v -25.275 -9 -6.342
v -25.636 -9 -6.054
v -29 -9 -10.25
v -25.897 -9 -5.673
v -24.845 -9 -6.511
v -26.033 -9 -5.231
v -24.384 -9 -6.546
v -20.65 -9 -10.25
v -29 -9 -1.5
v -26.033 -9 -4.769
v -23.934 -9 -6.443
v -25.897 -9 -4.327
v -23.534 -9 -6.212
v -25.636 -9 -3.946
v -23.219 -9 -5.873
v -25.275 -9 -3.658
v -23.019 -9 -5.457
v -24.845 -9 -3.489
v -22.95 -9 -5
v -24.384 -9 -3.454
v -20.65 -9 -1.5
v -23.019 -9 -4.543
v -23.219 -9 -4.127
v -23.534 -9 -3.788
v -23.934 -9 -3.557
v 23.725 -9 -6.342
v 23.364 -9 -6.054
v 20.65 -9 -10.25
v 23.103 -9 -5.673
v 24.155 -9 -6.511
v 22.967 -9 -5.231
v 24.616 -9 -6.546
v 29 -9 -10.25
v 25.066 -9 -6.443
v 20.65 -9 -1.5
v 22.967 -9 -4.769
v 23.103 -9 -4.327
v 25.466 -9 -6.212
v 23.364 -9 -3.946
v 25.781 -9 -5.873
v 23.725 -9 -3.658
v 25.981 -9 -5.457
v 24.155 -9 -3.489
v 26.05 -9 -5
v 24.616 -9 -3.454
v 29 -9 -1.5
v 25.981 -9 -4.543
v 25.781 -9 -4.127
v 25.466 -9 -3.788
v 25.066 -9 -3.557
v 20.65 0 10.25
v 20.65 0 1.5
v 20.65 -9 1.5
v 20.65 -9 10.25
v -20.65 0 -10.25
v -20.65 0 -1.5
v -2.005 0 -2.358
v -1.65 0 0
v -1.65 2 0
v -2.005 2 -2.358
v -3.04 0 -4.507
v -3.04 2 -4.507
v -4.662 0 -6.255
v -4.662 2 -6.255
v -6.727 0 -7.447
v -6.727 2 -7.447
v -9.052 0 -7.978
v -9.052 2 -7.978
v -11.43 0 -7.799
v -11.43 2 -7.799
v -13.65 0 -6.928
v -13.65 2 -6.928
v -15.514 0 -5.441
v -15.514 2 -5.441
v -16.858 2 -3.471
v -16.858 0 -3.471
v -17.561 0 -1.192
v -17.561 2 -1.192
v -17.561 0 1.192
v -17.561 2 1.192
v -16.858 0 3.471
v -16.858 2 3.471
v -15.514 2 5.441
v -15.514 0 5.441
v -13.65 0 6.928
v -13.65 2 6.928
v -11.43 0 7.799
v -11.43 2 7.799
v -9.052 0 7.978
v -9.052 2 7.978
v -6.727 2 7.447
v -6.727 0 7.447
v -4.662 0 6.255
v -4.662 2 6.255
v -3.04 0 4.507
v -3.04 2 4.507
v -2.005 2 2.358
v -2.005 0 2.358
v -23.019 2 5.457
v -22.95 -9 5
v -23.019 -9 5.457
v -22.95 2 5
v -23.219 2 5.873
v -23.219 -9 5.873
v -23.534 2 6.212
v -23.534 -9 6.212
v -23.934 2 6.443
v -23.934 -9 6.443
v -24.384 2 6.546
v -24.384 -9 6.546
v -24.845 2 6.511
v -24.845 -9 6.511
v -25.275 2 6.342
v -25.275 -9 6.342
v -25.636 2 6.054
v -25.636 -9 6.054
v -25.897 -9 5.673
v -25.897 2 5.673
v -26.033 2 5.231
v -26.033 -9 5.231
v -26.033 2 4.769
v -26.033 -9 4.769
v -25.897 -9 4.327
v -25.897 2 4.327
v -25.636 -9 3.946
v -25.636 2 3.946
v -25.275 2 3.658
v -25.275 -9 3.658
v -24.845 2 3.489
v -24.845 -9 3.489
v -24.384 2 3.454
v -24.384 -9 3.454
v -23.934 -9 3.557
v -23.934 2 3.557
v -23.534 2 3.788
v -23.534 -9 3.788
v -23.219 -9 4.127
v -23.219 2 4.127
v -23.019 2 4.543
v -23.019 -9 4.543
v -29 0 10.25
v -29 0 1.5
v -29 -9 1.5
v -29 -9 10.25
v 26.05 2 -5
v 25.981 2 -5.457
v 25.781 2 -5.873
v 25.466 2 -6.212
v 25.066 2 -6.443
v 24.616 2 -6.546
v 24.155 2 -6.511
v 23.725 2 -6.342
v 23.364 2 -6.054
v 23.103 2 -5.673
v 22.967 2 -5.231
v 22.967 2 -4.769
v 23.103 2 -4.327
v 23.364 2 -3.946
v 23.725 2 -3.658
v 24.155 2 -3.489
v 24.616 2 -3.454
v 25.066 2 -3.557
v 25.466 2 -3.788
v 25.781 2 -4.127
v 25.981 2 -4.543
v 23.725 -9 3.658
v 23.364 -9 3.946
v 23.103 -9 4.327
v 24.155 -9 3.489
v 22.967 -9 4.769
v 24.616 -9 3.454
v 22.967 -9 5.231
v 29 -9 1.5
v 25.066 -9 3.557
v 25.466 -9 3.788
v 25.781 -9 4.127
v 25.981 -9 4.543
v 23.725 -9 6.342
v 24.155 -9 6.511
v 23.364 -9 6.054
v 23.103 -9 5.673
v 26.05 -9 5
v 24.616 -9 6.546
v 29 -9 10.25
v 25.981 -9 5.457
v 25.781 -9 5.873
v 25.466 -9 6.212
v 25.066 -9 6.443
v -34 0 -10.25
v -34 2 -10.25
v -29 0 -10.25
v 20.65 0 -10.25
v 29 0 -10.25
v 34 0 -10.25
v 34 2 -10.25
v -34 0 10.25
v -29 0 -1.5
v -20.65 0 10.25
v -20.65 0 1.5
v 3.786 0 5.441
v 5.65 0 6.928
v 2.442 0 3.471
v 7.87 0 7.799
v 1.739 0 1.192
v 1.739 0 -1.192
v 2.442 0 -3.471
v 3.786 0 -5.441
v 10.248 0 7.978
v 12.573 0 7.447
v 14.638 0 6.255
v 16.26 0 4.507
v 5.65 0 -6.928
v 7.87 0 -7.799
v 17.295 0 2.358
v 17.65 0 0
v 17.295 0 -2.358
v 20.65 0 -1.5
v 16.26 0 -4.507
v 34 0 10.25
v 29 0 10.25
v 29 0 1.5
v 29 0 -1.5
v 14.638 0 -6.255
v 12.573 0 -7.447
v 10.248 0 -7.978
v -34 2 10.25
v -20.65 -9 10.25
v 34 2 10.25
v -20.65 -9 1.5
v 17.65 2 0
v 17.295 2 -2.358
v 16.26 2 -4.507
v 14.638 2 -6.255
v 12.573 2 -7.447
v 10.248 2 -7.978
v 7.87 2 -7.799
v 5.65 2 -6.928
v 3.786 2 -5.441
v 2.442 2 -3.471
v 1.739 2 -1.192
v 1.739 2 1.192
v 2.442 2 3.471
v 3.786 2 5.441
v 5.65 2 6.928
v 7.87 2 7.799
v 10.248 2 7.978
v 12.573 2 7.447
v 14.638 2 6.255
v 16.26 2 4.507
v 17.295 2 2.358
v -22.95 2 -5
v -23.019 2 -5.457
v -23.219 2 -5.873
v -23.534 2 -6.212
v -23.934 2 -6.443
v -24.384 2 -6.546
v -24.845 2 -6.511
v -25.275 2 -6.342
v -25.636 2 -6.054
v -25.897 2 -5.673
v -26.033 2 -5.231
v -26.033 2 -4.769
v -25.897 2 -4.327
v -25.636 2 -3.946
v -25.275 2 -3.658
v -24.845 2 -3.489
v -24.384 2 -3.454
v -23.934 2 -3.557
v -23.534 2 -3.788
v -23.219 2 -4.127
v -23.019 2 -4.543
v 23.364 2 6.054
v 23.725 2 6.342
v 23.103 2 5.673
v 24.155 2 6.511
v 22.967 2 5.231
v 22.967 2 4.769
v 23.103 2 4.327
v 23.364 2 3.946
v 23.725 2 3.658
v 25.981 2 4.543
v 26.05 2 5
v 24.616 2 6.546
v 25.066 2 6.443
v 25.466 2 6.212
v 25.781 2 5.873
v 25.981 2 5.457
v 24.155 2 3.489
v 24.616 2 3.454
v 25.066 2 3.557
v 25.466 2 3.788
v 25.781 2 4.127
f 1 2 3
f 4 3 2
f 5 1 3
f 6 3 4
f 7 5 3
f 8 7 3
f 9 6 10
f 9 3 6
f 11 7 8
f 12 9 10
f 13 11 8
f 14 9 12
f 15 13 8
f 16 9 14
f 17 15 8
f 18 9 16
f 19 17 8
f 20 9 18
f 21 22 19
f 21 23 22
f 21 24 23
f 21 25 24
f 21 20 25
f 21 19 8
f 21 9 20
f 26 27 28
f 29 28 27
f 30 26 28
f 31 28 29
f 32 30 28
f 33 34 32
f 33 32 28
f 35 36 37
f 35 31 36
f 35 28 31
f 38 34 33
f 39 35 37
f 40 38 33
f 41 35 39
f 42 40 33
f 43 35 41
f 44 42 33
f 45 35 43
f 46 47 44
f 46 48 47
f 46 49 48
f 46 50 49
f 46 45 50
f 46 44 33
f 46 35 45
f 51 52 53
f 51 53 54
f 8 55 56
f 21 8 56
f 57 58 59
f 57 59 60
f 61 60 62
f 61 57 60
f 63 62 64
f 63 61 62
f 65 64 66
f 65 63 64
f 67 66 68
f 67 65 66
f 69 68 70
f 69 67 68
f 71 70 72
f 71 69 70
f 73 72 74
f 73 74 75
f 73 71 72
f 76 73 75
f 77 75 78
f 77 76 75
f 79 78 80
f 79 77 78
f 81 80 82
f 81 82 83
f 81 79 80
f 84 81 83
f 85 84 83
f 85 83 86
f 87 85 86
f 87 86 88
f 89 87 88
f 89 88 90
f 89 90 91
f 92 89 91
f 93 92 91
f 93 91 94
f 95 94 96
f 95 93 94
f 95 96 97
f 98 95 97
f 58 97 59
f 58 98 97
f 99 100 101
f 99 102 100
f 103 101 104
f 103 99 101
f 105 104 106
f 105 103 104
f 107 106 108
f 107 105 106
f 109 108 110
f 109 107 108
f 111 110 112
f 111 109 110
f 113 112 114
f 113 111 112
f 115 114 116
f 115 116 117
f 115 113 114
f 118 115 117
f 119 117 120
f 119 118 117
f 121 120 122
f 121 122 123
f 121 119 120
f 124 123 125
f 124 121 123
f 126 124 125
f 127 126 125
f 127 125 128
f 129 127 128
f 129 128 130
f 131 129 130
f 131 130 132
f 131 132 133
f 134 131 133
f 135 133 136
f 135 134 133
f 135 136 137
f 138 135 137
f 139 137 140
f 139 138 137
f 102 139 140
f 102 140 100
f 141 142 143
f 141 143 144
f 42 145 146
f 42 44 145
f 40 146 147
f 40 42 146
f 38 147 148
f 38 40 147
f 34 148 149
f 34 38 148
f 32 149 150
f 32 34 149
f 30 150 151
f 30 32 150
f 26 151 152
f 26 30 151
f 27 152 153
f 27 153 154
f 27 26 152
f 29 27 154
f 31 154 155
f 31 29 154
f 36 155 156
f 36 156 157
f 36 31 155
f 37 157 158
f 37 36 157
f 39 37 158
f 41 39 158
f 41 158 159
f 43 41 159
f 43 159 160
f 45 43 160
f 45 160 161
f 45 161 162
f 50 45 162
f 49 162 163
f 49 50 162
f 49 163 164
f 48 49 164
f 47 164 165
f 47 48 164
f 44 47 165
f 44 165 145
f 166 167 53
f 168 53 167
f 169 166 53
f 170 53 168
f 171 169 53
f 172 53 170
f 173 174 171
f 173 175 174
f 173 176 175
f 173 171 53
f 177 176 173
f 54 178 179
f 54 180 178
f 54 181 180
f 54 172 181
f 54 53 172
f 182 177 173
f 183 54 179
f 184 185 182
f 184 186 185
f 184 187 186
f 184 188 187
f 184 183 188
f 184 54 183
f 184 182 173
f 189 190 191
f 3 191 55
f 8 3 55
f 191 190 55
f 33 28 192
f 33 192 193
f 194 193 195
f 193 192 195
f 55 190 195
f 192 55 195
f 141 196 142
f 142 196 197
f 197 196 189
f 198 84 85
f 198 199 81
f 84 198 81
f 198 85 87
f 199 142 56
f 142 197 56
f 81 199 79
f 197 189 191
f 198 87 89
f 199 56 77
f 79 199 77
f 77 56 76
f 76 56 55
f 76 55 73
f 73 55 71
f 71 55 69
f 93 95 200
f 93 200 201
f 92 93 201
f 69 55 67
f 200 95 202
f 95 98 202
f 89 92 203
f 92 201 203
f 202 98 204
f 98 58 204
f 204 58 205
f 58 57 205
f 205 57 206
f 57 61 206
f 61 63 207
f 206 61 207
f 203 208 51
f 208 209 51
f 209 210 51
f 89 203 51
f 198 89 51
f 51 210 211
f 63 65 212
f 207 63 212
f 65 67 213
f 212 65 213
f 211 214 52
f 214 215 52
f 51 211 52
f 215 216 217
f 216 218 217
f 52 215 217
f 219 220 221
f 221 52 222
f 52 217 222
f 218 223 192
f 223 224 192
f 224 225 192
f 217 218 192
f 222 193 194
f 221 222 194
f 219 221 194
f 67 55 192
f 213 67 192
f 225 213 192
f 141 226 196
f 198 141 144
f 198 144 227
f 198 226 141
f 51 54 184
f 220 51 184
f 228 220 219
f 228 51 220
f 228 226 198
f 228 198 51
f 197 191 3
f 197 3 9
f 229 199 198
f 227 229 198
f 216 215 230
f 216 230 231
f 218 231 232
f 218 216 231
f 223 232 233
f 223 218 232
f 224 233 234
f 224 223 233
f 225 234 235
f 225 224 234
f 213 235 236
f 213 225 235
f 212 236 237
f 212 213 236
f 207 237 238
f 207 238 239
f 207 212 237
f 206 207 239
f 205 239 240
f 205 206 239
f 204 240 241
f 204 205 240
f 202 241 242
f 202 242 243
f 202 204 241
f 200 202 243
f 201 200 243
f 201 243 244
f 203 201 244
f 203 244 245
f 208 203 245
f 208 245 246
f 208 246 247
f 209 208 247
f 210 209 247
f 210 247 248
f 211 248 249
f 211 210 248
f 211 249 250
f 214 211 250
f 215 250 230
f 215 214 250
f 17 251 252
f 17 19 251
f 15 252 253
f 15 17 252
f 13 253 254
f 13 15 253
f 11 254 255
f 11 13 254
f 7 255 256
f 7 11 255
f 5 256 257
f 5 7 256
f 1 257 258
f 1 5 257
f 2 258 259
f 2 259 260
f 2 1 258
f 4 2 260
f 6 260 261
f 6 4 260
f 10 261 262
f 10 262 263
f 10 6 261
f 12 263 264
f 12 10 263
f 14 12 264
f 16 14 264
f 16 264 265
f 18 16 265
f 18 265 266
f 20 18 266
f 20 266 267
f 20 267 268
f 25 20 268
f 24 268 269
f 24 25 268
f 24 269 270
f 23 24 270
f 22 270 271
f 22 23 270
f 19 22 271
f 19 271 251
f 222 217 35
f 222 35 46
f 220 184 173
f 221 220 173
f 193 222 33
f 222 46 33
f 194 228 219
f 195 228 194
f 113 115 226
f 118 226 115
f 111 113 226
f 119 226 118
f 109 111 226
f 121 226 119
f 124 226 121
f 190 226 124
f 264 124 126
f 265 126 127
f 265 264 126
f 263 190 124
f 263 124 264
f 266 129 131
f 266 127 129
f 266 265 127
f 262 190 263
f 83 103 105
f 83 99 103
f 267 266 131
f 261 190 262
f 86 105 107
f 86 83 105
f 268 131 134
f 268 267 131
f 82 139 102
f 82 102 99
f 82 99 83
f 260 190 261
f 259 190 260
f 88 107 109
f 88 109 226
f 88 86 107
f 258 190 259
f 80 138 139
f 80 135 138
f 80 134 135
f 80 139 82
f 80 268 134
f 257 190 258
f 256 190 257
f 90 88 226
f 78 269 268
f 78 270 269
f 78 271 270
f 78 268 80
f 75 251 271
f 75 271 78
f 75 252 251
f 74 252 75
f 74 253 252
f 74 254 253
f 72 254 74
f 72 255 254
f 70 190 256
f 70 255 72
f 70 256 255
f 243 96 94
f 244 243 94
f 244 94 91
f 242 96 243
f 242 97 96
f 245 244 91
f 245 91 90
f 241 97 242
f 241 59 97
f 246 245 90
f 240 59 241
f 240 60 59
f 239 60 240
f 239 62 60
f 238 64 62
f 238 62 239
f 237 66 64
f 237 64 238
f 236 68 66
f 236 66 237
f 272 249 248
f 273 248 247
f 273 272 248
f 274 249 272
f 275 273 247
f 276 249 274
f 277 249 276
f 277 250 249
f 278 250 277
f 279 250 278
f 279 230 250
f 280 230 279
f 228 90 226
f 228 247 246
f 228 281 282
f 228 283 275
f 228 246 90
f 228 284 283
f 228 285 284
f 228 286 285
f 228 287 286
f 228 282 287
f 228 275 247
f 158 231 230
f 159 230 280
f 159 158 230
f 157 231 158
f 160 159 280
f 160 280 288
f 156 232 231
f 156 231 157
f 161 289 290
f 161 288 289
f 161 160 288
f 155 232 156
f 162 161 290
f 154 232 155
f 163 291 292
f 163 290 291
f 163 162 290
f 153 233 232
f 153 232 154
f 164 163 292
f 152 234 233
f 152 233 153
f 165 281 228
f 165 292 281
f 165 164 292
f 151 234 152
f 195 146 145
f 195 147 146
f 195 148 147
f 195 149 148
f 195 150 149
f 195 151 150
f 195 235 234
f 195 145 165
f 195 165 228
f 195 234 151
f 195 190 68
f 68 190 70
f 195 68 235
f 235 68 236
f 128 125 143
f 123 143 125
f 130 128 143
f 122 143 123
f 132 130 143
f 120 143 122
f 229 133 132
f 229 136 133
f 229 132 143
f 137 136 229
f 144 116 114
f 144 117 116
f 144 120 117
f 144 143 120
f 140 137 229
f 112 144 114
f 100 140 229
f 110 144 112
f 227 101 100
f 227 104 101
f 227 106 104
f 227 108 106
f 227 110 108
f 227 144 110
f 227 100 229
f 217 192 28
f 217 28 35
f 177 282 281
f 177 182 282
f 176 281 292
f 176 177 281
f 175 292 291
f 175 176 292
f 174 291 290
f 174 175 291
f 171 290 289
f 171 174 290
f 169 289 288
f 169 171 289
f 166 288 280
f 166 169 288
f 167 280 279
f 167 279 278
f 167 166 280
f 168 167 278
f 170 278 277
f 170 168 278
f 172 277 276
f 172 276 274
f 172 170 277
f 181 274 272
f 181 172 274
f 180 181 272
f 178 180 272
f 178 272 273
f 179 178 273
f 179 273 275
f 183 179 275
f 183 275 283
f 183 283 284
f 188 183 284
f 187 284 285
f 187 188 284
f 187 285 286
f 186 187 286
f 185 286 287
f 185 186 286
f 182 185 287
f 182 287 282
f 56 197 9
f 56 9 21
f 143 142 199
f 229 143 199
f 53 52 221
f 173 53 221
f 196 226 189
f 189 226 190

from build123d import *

# Parameters (mm, degrees)
SKETCH2_W           = 58
SKETCH2_H           = 20.5
SKETCH2_R           = 8
SKETCH2_R_2         = 1.55
BOSS_EXTRUDE1_DEPTH = 2
SKETCH3_W           = 8.35
SKETCH3_H           = 8.75
SKETCH3_R           = 1.55
BOSS_EXTRUDE2_DEPTH = 9
SKETCH4_W           = 5
SKETCH4_H           = 20.5
BOSS_EXTRUDE3_DEPTH = 2


with BuildPart() as part:
    # Sketch2 → Boss-Extrude1 (new body)
    with BuildSketch(Plane(origin=(0, 0, 0), x_dir=(1, 0, 0), z_dir=(0, 1, 0))):
        Rectangle(SKETCH2_W, SKETCH2_H)
        with Locations((-9.65, 0)):
            Circle(SKETCH2_R, mode=Mode.SUBTRACT)
        with Locations((-24.5, 5)):
            Circle(SKETCH2_R_2, mode=Mode.SUBTRACT)
        with Locations((-24.5, -5)):
            Circle(SKETCH2_R_2, mode=Mode.SUBTRACT)
        with Locations((24.5, 5)):
            Circle(SKETCH2_R_2, mode=Mode.SUBTRACT)
        with Locations((24.5, -5)):
            Circle(SKETCH2_R_2, mode=Mode.SUBTRACT)
        with Locations((9.65, 0)):
            Circle(SKETCH2_R, mode=Mode.SUBTRACT)
    extrude(amount=BOSS_EXTRUDE1_DEPTH)

    # Sketch3 → Boss-Extrude2 (add)
    with BuildSketch(Plane.XZ):
        with Locations((-24.825, 5.875)):
            Rectangle(SKETCH3_W, SKETCH3_H)
        with Locations((-24.5, 5)):
            Circle(SKETCH3_R, mode=Mode.SUBTRACT)
        with Locations((-24.825, -5.875)):
            Rectangle(SKETCH3_W, SKETCH3_H)
        with Locations((-24.5, -5)):
            Circle(SKETCH3_R, mode=Mode.SUBTRACT)
        with Locations((24.825, 5.875)):
            Rectangle(SKETCH3_W, SKETCH3_H)
        with Locations((24.5, 5)):
            Circle(SKETCH3_R, mode=Mode.SUBTRACT)
        with Locations((24.825, -5.875)):
            Rectangle(SKETCH3_W, SKETCH3_H)
        with Locations((24.5, -5)):
            Circle(SKETCH3_R, mode=Mode.SUBTRACT)
    extrude(amount=BOSS_EXTRUDE2_DEPTH)

    # Sketch4 → Boss-Extrude3 (add)
    with BuildSketch(Plane(origin=(0, 2, 0), x_dir=(1, 0, 0), z_dir=(0, 1, 0))):
        with Locations((-31.5, 0)):
            Rectangle(SKETCH4_W, SKETCH4_H)
        with Locations((31.5, 0)):
            Rectangle(SKETCH4_W, SKETCH4_H)
    extrude(amount=-BOSS_EXTRUDE3_DEPTH)


solid = part.part
